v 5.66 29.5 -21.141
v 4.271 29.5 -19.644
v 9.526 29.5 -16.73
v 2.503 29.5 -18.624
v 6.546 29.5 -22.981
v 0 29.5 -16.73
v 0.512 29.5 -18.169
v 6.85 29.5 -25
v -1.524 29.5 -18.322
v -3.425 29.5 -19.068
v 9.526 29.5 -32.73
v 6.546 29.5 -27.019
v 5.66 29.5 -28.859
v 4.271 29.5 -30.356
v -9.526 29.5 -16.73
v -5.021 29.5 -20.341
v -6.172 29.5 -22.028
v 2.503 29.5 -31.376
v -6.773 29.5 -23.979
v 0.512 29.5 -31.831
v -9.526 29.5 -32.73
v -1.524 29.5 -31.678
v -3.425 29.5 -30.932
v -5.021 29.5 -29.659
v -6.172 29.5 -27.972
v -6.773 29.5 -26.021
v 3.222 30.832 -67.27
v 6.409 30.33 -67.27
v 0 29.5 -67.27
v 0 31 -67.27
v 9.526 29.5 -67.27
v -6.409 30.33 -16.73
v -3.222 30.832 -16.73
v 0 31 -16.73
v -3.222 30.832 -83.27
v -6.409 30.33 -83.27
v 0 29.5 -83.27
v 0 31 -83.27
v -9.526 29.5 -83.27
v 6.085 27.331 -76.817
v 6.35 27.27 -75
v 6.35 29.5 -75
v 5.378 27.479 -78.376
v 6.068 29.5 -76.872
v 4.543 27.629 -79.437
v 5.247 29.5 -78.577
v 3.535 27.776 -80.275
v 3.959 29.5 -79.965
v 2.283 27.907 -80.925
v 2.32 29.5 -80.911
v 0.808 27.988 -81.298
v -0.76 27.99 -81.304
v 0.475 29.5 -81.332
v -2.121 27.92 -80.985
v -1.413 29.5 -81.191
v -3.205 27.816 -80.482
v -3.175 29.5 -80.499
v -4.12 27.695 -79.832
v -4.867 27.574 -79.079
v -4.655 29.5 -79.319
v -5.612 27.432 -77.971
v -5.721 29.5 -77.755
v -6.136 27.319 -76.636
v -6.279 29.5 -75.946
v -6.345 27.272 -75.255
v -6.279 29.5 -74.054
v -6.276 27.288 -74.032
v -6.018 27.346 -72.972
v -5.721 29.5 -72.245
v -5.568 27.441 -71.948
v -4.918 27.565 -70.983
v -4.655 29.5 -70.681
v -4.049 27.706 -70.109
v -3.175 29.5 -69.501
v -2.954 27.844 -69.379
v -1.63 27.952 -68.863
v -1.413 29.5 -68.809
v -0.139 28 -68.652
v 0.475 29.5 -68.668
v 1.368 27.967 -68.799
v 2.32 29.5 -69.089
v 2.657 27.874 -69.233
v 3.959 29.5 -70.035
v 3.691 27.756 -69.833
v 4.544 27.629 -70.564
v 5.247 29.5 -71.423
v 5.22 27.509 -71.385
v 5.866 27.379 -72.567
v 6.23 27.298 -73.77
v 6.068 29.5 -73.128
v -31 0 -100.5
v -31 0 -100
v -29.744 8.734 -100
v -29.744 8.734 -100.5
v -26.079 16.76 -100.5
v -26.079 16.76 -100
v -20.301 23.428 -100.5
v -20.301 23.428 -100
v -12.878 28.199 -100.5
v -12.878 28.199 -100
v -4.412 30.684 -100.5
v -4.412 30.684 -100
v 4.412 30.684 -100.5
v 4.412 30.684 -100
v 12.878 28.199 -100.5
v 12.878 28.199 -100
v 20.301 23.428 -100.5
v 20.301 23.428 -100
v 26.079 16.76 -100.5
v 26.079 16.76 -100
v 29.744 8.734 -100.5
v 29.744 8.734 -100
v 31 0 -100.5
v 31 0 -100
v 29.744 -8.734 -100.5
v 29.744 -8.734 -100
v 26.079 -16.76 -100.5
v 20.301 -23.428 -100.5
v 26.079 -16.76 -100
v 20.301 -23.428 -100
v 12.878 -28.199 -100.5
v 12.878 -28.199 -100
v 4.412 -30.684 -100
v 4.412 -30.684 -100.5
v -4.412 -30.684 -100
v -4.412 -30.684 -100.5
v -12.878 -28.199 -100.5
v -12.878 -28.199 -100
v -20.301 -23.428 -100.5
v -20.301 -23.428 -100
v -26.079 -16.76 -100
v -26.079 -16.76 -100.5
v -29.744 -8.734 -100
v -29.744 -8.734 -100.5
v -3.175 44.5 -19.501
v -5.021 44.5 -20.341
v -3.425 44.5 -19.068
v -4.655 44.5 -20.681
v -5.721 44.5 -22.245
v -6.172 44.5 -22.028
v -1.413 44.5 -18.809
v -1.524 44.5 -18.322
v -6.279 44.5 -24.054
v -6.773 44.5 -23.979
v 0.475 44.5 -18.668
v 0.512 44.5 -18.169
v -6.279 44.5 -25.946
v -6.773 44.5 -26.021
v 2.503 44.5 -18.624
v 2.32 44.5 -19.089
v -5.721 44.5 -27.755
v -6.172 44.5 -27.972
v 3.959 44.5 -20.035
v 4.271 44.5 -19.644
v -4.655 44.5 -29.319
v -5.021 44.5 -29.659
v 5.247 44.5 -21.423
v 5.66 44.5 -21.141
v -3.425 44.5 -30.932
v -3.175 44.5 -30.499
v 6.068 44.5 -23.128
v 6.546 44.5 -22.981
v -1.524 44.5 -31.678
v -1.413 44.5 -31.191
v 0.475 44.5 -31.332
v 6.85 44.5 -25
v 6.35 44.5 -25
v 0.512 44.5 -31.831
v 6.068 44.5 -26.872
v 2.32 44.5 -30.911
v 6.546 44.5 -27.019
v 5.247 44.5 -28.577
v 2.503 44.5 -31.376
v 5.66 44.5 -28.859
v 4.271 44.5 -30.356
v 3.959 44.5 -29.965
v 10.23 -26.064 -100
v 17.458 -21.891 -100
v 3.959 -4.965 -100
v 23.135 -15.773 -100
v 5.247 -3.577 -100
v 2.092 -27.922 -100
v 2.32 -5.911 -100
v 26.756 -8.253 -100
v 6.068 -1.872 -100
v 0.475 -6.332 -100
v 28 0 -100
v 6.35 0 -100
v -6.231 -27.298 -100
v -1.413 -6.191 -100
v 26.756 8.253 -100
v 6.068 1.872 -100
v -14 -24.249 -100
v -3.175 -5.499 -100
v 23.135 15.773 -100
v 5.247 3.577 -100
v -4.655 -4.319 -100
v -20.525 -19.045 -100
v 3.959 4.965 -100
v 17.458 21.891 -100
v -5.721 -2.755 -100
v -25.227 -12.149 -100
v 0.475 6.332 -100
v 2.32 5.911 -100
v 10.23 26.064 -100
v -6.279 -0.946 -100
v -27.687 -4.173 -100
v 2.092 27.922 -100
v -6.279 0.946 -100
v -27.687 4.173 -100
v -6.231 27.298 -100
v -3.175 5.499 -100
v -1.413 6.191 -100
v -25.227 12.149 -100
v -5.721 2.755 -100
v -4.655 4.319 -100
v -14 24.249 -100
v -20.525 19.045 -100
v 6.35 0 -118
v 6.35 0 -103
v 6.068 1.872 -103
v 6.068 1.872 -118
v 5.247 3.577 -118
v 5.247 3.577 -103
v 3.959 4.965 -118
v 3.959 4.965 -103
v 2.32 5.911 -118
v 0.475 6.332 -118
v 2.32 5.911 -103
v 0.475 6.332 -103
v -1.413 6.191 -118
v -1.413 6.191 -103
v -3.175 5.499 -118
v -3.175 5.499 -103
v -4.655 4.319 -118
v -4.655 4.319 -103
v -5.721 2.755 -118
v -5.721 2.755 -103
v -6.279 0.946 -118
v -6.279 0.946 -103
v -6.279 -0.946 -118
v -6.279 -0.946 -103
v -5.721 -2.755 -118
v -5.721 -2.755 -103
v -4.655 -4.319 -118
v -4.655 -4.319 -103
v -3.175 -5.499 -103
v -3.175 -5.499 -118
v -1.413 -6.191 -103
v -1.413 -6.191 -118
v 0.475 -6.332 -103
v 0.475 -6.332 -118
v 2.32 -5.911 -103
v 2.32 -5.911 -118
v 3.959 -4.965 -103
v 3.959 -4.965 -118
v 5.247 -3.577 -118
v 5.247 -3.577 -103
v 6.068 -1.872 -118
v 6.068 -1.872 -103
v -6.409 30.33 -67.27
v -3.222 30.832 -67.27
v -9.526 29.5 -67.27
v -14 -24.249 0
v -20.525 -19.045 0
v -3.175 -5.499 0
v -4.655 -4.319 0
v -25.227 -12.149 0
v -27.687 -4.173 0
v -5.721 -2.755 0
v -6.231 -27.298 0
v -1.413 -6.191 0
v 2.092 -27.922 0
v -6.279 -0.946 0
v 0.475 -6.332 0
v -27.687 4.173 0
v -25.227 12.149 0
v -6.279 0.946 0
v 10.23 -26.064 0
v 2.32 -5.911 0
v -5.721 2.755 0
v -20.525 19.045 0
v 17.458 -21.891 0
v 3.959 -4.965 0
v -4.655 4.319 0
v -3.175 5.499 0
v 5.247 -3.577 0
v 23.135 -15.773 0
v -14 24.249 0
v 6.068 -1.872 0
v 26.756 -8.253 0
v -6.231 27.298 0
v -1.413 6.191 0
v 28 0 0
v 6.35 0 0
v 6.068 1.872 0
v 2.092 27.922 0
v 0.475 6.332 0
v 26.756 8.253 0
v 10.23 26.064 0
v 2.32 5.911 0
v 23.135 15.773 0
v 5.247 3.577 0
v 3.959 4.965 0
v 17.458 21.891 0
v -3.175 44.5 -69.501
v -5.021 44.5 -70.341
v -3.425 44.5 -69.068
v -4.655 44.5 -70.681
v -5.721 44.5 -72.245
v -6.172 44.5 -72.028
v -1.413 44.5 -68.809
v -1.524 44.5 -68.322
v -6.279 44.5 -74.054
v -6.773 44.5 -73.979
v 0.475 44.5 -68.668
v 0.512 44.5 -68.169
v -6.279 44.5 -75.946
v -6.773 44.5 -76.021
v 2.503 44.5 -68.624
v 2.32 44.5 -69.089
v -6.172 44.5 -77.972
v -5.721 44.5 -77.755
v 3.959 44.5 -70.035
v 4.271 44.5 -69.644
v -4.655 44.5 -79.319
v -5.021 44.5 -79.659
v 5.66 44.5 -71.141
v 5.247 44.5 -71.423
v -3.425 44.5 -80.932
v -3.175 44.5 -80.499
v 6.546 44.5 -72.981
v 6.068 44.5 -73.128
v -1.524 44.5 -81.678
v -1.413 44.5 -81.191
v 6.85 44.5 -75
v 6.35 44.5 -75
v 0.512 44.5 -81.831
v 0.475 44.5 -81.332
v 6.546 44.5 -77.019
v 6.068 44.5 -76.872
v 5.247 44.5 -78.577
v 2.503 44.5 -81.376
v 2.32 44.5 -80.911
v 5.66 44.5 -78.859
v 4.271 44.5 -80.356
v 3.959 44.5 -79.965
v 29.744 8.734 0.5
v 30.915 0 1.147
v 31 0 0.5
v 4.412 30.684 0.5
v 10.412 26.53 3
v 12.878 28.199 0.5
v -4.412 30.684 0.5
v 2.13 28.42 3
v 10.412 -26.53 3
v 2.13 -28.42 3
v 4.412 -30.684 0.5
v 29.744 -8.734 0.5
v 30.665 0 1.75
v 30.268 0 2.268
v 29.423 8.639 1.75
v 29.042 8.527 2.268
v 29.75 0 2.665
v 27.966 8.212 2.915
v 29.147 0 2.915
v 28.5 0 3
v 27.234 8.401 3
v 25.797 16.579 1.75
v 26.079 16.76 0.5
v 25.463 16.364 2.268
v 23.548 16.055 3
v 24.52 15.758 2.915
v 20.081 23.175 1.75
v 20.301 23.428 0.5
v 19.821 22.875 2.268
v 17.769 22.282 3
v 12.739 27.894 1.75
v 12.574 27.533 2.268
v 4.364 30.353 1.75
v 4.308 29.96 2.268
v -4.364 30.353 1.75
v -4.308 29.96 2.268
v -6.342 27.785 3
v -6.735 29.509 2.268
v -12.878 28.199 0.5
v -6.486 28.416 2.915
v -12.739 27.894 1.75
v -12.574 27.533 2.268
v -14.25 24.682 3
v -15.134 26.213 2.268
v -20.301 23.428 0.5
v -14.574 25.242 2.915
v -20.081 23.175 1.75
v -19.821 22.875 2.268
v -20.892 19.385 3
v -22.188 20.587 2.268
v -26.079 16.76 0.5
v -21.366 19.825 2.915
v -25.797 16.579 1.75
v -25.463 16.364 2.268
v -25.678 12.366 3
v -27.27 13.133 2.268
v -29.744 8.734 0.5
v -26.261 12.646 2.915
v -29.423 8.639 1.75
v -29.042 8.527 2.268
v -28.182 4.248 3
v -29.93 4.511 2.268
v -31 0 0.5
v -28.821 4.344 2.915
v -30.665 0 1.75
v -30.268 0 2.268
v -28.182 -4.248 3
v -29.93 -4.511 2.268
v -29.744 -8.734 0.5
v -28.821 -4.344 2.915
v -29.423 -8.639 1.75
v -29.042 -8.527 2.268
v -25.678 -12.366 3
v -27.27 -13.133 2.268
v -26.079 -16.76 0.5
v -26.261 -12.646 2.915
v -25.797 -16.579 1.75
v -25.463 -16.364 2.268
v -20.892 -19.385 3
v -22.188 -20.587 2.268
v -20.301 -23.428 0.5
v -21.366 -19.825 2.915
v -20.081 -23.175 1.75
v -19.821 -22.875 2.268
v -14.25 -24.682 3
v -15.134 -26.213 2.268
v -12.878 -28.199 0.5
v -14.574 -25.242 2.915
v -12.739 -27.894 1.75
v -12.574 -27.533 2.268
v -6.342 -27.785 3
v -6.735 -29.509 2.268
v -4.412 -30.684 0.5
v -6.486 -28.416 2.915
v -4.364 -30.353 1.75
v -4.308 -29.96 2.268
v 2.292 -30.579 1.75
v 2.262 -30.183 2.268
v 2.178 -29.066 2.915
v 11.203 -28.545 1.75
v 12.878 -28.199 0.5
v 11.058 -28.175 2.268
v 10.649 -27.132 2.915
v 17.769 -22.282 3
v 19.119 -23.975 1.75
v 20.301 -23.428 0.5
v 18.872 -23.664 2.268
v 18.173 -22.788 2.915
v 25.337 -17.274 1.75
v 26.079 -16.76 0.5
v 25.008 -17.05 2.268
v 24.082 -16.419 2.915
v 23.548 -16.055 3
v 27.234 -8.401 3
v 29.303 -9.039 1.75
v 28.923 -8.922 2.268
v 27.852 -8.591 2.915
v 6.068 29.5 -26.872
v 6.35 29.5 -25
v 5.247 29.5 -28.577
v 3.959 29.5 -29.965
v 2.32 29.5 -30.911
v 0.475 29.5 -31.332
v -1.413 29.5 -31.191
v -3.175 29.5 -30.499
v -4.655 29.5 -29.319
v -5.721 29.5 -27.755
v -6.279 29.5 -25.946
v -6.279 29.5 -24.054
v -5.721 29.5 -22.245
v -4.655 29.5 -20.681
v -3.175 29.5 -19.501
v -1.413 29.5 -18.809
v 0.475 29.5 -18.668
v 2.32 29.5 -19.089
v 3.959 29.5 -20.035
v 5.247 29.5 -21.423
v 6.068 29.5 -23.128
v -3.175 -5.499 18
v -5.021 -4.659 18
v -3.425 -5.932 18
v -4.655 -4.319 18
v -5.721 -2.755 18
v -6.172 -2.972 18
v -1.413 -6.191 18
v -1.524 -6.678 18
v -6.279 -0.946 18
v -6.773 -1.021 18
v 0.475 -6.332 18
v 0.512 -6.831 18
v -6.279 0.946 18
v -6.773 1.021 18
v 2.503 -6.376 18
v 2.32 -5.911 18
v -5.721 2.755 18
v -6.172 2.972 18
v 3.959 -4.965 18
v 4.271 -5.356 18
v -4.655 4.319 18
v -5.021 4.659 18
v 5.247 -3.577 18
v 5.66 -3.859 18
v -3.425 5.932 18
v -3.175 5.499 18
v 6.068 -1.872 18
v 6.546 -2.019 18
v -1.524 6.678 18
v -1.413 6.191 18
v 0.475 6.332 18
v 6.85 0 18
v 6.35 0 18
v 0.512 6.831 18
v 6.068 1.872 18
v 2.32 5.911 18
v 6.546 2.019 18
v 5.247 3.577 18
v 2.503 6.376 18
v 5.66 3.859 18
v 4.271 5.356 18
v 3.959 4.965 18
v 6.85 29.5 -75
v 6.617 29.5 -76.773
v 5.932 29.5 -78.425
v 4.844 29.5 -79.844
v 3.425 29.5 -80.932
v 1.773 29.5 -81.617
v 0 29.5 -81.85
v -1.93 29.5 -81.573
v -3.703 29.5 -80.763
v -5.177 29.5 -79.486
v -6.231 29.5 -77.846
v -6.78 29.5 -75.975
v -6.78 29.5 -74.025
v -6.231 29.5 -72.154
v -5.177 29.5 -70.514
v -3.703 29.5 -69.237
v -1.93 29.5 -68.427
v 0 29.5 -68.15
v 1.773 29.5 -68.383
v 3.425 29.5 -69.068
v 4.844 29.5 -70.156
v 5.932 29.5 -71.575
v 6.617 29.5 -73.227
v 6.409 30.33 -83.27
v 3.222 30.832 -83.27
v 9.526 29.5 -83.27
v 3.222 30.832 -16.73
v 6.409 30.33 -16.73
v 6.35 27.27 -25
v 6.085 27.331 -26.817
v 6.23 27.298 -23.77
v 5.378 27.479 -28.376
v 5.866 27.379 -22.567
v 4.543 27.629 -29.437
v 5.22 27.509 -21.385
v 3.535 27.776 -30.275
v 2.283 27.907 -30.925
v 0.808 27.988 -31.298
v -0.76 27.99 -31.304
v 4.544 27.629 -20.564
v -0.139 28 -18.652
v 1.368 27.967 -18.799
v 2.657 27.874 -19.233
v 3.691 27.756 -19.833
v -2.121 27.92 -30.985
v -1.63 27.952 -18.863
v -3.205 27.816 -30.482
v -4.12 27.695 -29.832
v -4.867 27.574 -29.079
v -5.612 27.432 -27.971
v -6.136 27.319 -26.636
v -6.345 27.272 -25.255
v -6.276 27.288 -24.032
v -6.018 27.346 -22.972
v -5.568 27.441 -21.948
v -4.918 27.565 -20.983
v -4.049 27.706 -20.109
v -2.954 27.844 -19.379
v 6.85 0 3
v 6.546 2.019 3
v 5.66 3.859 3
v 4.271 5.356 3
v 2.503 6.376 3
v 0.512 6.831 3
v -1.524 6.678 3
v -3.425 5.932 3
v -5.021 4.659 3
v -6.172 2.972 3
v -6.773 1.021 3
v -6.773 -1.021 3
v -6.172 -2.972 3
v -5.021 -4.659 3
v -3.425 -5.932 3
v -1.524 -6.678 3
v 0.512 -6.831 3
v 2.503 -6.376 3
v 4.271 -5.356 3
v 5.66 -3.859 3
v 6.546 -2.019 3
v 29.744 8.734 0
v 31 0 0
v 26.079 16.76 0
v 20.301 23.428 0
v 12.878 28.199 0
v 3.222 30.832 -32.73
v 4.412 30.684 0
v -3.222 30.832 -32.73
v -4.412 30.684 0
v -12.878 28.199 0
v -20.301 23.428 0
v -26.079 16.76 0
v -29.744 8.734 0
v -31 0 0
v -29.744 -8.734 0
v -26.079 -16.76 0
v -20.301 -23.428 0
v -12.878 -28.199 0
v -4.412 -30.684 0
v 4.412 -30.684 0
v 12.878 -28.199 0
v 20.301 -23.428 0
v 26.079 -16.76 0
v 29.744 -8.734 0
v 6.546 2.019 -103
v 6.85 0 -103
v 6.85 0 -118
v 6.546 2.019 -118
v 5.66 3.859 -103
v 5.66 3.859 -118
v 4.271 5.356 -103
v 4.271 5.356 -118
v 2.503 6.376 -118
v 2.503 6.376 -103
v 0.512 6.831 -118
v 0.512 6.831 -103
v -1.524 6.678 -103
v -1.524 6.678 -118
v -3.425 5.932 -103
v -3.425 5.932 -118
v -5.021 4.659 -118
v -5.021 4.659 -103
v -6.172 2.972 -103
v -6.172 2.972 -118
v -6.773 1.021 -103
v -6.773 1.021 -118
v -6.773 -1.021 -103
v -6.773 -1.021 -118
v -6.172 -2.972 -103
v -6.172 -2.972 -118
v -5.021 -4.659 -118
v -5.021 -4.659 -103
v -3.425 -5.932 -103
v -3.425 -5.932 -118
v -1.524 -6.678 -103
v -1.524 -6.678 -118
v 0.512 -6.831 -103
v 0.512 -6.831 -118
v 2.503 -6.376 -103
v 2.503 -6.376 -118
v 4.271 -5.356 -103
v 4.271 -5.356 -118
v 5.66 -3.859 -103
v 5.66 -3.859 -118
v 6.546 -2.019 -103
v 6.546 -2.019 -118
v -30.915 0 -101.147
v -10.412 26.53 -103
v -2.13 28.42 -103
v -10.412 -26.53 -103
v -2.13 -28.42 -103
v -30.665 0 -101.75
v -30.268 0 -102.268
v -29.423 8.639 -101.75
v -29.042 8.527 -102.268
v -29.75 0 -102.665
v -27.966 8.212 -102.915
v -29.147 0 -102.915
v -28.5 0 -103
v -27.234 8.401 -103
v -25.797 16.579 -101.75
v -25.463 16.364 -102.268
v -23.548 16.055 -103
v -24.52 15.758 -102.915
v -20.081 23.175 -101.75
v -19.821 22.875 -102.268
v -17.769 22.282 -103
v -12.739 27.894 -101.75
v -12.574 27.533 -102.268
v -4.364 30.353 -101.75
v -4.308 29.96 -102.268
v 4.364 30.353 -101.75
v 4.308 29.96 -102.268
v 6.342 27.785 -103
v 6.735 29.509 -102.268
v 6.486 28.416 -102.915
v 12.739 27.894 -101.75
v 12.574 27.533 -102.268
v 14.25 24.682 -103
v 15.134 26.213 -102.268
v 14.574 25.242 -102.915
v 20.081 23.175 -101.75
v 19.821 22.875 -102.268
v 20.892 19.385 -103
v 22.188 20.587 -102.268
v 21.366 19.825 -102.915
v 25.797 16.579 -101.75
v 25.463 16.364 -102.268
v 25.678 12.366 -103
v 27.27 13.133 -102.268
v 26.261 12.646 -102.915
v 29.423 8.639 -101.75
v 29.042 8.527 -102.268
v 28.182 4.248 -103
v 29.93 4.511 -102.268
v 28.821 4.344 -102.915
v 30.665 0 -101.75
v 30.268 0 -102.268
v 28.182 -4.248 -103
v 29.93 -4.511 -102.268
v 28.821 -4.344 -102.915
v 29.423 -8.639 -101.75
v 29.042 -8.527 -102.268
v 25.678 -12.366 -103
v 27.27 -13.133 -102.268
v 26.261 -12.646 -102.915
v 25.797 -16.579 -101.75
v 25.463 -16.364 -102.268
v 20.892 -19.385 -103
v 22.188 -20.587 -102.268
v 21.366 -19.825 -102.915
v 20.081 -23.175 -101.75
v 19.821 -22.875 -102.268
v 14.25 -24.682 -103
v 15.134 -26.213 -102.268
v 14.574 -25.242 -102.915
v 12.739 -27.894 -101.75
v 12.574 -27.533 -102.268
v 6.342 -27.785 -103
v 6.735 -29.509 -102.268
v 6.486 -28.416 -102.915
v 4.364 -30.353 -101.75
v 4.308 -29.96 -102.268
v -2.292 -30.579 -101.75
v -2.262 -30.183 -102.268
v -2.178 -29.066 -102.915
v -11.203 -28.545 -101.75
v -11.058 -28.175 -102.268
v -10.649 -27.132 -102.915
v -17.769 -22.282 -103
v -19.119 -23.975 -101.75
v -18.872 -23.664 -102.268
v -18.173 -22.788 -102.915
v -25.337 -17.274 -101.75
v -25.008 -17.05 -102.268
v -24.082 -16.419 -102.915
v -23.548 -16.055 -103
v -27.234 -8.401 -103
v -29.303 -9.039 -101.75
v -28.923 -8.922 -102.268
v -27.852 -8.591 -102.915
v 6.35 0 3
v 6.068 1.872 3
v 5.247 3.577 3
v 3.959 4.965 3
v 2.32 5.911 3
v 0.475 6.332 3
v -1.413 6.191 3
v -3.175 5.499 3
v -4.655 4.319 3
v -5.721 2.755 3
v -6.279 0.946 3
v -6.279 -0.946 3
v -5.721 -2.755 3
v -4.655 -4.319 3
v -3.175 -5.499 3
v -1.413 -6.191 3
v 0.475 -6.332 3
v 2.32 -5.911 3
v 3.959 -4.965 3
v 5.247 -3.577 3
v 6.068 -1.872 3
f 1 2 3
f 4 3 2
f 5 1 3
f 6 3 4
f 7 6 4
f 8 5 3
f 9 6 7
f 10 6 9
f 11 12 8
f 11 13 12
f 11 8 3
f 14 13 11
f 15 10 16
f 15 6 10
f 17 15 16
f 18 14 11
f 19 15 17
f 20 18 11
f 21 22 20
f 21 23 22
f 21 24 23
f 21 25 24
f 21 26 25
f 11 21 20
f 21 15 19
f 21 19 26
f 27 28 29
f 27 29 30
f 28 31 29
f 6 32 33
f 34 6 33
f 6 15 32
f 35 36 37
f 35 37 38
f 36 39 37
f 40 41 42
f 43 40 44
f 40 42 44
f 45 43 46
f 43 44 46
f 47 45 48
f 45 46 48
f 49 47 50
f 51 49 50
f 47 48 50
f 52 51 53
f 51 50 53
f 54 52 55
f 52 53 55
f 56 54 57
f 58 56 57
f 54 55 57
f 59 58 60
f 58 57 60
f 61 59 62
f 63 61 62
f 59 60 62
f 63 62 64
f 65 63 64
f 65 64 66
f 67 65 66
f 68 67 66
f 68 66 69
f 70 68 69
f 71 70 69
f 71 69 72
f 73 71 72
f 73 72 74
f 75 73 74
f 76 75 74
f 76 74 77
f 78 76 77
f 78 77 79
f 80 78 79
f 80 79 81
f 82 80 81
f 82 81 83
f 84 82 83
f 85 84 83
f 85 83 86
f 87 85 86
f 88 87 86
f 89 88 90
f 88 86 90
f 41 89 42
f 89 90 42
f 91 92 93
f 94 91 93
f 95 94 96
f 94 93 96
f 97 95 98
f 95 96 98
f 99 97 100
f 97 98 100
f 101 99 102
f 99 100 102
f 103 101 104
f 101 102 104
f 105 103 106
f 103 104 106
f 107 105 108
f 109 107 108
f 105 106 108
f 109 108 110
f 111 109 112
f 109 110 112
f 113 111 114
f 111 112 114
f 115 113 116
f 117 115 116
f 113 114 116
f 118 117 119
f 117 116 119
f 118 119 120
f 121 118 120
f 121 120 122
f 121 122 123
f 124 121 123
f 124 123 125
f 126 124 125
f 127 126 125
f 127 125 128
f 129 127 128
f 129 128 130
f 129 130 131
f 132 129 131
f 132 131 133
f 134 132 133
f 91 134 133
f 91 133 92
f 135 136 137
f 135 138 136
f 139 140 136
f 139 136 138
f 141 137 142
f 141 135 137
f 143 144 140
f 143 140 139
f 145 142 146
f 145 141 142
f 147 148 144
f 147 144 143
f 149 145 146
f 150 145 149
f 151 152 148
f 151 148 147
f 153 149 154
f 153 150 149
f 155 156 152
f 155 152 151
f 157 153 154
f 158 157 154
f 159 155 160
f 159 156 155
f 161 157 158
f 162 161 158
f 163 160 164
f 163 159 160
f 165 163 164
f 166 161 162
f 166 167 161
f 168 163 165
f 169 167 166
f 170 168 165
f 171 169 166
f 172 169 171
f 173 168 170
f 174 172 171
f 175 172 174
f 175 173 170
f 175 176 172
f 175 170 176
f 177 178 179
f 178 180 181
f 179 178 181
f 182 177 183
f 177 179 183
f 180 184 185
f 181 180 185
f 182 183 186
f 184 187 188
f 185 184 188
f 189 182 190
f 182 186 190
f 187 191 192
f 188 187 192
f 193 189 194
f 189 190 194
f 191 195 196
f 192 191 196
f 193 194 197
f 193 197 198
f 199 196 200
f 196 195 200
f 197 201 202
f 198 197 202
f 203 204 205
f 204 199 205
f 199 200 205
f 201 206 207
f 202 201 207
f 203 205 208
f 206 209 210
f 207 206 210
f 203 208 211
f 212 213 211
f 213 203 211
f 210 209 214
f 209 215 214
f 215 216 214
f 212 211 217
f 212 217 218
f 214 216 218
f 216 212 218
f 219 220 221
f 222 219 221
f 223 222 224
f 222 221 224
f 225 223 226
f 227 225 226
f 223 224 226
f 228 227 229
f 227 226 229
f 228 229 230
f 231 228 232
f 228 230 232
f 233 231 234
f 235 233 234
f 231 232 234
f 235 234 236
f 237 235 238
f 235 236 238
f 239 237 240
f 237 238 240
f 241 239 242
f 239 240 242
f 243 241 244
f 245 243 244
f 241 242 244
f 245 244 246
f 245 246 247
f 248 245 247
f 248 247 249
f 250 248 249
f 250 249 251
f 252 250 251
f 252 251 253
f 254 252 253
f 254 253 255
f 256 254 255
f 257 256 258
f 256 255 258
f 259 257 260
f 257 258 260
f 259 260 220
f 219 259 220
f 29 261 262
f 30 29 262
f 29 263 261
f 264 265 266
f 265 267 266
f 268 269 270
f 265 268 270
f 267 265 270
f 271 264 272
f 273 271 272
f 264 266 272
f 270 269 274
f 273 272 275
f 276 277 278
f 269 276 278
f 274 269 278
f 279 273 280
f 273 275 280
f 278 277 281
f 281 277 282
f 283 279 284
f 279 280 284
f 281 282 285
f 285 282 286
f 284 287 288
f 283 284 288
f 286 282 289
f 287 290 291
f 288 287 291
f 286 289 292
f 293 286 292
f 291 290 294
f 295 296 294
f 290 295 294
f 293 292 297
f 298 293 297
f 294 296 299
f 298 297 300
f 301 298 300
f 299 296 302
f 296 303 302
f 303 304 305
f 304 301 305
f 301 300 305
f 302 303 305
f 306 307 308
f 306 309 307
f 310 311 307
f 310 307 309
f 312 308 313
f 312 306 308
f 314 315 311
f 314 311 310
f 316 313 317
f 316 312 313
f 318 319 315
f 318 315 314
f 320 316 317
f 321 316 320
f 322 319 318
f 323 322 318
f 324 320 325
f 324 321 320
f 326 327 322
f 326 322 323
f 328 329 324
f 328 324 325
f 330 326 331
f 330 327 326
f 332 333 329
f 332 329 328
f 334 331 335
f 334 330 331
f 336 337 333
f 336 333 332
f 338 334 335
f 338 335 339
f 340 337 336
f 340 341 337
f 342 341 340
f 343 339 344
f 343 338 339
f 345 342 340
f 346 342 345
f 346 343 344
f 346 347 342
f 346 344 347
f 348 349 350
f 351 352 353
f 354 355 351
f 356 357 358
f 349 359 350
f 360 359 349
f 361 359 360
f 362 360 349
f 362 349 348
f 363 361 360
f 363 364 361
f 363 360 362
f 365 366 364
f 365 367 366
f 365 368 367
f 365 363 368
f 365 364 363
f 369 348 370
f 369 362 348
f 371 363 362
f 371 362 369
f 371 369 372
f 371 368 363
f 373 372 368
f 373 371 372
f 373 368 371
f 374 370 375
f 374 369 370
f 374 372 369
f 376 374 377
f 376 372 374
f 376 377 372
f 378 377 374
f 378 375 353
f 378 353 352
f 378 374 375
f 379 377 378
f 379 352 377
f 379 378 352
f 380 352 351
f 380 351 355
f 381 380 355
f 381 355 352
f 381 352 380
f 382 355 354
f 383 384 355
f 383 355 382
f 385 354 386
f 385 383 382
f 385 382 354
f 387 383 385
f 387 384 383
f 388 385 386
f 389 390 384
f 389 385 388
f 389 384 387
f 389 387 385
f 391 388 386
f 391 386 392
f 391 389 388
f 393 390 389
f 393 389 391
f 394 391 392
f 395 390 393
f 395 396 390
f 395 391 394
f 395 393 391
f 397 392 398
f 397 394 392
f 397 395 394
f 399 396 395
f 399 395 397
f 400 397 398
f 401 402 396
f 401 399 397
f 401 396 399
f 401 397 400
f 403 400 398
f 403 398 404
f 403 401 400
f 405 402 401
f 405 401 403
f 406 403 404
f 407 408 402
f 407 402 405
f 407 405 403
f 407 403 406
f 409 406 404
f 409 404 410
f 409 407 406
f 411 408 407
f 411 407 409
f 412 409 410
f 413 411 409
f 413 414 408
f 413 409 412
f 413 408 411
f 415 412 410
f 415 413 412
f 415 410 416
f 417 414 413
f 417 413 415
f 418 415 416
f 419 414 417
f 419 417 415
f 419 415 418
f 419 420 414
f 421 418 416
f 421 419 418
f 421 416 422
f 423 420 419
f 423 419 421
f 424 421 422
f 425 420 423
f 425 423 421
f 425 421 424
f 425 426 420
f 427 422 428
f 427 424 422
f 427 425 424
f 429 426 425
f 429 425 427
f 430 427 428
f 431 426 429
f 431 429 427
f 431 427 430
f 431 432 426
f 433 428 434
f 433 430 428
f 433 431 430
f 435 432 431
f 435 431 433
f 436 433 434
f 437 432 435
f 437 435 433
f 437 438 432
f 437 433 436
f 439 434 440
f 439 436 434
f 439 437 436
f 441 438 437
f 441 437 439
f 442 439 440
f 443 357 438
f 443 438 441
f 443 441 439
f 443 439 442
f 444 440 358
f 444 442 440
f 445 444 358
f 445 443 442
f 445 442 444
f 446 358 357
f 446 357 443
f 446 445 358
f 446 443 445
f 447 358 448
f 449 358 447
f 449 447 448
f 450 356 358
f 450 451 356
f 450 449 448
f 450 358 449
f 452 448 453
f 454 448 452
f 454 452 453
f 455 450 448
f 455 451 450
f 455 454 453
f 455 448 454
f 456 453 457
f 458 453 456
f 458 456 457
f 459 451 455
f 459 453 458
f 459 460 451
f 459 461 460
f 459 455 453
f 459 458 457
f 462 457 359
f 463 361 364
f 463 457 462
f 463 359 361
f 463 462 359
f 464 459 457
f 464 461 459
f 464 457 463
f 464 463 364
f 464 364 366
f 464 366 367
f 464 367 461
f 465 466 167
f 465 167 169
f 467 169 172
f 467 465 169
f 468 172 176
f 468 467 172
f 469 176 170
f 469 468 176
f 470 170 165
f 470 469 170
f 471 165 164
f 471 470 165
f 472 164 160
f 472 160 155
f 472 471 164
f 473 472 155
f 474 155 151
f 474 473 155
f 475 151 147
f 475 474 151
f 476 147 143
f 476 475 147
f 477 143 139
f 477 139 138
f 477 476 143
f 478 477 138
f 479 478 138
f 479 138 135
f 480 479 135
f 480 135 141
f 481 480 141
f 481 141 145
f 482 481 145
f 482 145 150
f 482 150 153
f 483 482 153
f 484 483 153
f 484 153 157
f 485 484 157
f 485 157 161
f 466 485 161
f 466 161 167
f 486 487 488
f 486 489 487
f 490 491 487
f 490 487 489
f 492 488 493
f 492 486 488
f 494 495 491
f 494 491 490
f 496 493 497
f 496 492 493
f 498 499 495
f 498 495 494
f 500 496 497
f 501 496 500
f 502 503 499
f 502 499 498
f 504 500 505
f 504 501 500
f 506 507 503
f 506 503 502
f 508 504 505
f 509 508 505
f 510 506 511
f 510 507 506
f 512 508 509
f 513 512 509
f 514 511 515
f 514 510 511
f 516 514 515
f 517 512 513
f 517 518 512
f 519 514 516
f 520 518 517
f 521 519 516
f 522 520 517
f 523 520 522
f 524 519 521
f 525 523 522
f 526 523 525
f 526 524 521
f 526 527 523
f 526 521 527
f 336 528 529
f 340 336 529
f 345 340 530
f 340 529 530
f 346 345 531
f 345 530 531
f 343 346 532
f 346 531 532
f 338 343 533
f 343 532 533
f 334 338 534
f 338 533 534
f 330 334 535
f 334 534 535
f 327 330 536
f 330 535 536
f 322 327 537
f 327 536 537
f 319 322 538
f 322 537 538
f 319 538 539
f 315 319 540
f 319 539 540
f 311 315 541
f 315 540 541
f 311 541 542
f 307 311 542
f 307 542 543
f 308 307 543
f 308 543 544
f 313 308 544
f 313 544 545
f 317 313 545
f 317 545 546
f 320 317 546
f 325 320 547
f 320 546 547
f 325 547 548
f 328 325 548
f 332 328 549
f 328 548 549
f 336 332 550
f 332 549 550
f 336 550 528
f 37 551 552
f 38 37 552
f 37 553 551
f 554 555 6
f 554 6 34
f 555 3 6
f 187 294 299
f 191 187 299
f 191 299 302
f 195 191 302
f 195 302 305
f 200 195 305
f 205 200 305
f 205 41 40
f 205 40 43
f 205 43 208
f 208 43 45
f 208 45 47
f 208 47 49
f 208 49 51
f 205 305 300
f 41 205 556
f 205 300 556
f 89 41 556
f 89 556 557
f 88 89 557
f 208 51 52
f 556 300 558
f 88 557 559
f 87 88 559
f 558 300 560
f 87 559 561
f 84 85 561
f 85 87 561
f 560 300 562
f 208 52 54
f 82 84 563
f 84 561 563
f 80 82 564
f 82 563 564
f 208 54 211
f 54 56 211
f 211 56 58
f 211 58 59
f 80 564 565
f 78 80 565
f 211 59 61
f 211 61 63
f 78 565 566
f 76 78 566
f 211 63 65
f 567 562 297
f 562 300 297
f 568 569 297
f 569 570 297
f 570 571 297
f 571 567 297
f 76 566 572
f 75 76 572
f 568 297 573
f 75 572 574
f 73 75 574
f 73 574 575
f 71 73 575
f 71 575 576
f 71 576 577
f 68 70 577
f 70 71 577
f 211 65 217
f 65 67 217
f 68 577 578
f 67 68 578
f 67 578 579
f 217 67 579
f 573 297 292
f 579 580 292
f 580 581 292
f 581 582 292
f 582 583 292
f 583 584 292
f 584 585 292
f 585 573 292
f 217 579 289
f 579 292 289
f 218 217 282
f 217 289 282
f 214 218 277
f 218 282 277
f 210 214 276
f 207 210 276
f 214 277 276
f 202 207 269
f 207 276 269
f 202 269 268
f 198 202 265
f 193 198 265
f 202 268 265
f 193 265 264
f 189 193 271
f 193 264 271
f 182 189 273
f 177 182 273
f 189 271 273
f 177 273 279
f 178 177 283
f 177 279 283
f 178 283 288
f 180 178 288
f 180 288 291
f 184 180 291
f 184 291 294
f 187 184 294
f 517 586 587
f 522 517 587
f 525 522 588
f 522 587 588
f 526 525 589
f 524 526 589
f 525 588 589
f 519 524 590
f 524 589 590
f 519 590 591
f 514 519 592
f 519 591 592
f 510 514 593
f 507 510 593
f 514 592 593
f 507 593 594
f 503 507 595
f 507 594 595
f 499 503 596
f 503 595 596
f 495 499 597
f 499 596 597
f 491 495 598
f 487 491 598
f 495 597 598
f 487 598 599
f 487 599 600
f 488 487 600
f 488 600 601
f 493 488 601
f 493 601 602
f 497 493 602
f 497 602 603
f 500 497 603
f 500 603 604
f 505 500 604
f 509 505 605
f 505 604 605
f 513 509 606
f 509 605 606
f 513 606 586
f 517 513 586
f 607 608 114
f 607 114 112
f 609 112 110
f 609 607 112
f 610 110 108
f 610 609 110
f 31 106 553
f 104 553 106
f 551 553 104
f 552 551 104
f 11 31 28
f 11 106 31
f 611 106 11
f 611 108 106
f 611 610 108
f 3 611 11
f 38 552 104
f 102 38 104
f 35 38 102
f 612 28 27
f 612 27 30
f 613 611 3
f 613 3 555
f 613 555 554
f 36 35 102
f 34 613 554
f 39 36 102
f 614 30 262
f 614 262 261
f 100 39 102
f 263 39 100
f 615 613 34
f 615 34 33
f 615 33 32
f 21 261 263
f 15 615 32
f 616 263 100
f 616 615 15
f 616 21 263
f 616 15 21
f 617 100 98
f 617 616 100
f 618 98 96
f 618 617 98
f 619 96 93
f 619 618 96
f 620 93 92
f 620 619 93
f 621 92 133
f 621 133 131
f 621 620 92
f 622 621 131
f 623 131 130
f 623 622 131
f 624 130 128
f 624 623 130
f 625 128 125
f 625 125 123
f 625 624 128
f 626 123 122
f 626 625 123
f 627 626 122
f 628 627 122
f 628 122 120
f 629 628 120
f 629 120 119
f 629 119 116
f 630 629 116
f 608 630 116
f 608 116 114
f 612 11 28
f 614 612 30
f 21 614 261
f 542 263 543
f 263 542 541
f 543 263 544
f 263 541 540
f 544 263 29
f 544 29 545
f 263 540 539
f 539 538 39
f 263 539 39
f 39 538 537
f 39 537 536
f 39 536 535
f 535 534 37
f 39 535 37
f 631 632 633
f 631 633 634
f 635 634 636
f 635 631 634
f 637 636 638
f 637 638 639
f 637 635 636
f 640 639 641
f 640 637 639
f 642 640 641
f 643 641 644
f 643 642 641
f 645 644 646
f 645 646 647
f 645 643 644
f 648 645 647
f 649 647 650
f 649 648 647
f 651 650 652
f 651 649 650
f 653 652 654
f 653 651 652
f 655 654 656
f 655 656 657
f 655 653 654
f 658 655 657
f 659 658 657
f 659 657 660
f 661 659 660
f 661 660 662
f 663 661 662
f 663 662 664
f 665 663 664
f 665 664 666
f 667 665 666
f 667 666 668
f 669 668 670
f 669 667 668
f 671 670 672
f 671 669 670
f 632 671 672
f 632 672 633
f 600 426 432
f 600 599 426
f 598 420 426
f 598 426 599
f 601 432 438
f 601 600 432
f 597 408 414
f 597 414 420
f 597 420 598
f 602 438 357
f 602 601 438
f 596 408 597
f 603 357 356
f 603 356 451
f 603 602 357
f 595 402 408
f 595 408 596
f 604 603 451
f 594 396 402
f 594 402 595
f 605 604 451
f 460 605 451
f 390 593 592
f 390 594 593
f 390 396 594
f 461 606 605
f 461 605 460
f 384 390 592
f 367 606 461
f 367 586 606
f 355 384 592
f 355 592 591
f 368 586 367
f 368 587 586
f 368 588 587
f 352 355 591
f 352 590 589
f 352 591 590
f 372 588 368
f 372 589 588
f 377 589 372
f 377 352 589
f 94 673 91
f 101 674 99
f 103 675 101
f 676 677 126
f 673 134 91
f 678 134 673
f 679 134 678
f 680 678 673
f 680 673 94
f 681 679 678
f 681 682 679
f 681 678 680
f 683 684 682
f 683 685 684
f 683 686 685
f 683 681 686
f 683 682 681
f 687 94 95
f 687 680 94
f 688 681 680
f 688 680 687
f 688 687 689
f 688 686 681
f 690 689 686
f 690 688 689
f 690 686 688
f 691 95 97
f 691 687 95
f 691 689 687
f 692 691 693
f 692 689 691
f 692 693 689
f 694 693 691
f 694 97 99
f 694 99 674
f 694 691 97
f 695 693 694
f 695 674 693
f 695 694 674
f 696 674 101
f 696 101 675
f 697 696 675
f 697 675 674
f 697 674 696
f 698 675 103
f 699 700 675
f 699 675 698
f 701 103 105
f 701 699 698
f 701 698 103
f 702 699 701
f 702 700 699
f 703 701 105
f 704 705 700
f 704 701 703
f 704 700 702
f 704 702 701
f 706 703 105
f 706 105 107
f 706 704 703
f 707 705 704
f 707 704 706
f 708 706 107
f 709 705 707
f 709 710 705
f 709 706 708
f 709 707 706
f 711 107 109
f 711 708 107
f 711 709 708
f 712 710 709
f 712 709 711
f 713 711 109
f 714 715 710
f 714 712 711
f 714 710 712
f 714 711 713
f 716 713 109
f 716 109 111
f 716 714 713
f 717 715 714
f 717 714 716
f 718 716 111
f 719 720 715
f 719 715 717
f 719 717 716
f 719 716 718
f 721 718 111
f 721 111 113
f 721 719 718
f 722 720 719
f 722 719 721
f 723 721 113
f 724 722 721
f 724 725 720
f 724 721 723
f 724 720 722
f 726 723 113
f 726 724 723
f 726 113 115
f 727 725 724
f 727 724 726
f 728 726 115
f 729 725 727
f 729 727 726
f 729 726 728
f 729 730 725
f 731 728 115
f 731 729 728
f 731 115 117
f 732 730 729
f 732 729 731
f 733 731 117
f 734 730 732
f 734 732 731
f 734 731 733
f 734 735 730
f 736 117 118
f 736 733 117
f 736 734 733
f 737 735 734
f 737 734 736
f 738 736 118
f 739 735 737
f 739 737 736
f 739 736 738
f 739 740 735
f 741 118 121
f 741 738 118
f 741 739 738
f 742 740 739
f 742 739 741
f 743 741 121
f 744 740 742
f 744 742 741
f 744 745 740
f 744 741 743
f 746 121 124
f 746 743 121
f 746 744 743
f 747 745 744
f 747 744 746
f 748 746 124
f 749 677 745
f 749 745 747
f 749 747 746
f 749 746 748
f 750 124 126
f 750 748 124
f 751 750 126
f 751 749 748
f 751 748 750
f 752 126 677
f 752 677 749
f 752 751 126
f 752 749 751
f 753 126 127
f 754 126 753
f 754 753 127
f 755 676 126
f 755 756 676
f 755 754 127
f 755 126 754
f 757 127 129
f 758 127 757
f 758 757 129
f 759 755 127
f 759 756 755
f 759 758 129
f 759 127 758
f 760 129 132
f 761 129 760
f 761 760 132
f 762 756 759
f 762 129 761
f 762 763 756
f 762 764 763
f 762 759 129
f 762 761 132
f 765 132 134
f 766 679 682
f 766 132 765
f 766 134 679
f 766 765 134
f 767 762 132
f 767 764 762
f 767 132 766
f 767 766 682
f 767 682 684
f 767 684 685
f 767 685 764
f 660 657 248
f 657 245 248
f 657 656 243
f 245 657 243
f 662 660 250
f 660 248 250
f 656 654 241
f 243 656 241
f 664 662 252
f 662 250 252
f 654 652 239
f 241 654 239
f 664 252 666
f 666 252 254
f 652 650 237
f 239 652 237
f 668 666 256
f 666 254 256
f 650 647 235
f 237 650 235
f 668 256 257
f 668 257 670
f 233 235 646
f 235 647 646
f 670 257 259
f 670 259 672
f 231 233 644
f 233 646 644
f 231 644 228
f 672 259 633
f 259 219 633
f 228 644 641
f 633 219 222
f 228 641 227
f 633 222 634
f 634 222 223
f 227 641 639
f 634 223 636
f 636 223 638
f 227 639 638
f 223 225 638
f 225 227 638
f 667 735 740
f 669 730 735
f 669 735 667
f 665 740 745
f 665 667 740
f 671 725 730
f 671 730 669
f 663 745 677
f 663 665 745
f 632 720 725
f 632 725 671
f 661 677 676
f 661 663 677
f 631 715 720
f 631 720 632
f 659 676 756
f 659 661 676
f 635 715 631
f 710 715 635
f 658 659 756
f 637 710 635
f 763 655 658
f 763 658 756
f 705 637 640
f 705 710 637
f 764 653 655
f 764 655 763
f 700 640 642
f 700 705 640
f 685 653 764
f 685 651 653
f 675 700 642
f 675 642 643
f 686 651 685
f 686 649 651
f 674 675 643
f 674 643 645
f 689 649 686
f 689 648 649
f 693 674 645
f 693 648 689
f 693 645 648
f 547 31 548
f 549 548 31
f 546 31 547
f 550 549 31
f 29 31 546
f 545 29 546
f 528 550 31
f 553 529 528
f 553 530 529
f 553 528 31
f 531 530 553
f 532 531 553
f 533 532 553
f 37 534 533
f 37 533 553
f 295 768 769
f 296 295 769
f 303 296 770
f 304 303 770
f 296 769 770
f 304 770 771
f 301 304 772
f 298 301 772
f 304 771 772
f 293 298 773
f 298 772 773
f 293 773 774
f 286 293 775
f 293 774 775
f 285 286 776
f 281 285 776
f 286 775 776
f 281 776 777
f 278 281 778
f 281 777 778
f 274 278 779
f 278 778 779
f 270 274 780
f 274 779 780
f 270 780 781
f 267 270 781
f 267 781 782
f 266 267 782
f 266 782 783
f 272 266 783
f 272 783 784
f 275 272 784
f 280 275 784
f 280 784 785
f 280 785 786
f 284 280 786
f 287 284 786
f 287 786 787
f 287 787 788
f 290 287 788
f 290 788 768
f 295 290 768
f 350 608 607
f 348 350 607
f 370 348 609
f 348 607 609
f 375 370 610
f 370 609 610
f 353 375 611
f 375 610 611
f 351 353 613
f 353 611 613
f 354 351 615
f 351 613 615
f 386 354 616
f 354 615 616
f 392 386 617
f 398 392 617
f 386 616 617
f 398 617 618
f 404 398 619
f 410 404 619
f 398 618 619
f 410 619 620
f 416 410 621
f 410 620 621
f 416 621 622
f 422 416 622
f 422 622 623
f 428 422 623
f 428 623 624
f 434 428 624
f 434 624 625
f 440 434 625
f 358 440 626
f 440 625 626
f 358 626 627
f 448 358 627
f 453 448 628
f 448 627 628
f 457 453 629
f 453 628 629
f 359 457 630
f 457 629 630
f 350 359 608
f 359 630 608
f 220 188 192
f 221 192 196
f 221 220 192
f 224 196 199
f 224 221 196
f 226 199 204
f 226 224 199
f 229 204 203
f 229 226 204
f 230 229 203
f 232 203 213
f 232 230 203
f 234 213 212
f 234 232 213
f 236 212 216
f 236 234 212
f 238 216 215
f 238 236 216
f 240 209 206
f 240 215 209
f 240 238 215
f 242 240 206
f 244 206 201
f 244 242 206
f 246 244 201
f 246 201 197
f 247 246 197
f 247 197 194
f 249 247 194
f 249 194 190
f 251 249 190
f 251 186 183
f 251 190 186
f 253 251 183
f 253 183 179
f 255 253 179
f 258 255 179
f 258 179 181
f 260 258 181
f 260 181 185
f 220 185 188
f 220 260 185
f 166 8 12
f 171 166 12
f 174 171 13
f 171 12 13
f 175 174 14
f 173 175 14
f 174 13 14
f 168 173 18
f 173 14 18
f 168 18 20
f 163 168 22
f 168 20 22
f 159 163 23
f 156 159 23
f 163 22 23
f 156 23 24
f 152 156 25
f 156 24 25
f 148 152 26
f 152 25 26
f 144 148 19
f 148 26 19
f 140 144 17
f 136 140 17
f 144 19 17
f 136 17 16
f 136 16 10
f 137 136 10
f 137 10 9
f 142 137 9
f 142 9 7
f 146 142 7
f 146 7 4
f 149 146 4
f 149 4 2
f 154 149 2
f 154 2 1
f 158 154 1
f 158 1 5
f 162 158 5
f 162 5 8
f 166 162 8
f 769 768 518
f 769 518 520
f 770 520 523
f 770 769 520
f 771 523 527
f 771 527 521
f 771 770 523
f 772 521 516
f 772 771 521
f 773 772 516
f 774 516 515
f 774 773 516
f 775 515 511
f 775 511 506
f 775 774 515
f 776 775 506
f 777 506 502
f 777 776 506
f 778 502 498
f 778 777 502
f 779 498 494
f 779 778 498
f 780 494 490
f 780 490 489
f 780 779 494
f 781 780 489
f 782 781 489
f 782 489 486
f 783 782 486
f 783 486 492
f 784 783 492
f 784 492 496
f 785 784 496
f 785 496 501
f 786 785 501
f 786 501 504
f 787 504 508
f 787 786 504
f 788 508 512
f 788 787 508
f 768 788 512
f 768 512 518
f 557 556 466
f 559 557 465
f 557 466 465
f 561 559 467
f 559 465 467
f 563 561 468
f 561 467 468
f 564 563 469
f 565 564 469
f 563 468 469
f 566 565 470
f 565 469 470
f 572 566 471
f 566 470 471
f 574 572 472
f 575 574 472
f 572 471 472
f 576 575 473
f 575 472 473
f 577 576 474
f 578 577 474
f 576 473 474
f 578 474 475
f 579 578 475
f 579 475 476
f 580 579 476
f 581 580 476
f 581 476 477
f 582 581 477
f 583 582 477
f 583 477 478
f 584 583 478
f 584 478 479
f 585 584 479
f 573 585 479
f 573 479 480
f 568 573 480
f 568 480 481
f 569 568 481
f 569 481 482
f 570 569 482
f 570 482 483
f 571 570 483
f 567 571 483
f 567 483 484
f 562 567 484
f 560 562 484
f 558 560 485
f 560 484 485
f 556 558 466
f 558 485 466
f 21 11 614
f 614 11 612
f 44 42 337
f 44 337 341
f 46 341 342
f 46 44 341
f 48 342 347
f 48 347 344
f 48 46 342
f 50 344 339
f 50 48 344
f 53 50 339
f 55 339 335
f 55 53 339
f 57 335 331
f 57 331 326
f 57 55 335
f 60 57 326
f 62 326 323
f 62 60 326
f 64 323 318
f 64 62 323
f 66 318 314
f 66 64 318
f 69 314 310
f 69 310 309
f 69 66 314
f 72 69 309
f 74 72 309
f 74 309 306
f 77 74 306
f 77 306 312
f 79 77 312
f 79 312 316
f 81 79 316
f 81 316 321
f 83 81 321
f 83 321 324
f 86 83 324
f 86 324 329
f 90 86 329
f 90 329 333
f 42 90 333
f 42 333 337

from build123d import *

# Parameters (mm, degrees)
SKETCH2_R               = 31
SKETCH2_R_2             = 28
BOSS_EXTRUDE1_DEPTH     = 100
SKETCH3_R               = 31
BOSS_EXTRUDE2_DEPTH     = 3
SKETCH4_R               = 31
BOSS_EXTRUDE3_DEPTH     = 3
SKETCH5_W               = 16
SKETCH5_H               = 1.5
CUT_EXTRUDE1_DEPTH      = 32
CUT_EXTRUDE1_DEPTH_BACK = 32
SKETCH6_R               = 6.85
SKETCH6_R_2             = 6.35
BOSS_EXTRUDE4_DEPTH     = 15
SKETCH6_2_R             = 6.35
CUT_EXTRUDE2_DEPTH      = 15
SKETCH7_R               = 6.85
SKETCH7_R_2             = 6.35
BOSS_EXTRUDE5_DEPTH     = 15
SKETCH7_2_R             = 6.35
CUT_EXTRUDE3_DEPTH      = 15
FILLET1_R               = 2.5


with BuildPart() as part:
    # Sketch2 → Boss-Extrude1 (new body)
    with BuildSketch(Plane.XY):
        Circle(SKETCH2_R)
        Circle(SKETCH2_R_2, mode=Mode.SUBTRACT)
    extrude(amount=-BOSS_EXTRUDE1_DEPTH)

    # Sketch3 → Boss-Extrude2 (add)
    with BuildSketch(Plane.XY):
        Circle(SKETCH3_R)
    extrude(amount=BOSS_EXTRUDE2_DEPTH)

    # Sketch4 → Boss-Extrude3 (add)
    with BuildSketch(Plane(origin=(0, 0, -100), x_dir=(-1, 0, 0), z_dir=(0, 0, -1))):
        Circle(SKETCH4_R)
    extrude(amount=BOSS_EXTRUDE3_DEPTH)

    # Sketch5 → Cut-Extrude1 (cut, two sides)
    with BuildSketch(Plane(origin=(0, 0, 0), x_dir=(0, 0, -1), z_dir=(1, 0, 0))) as cut_extrude1_sk:
        with Locations((75.269911272, 30.25)):
            Rectangle(SKETCH5_W, SKETCH5_H)
        with Locations((24.730088728, 30.25)):
            Rectangle(SKETCH5_W, SKETCH5_H)
    extrude(amount=CUT_EXTRUDE1_DEPTH, mode=Mode.SUBTRACT)
    extrude(cut_extrude1_sk.sketch, amount=-CUT_EXTRUDE1_DEPTH_BACK, mode=Mode.SUBTRACT)

    # Sketch6 → Boss-Extrude4 (add)
    with BuildSketch(Plane(origin=(0, 29.5, 0), x_dir=(1, 0, 0), z_dir=(0, 1, 0))):
        with Locations((0, 25)):
            Circle(SKETCH6_R)
        with Locations((0, 25)):
            Circle(SKETCH6_R_2, mode=Mode.SUBTRACT)
        with Locations((0, 75)):
            Circle(SKETCH6_R)
        with Locations((0, 75)):
            Circle(SKETCH6_R_2, mode=Mode.SUBTRACT)
    extrude(amount=BOSS_EXTRUDE4_DEPTH)

    # Sketch6<2> → Cut-Extrude2 (cut)
    with BuildSketch(Plane(origin=(0, 29.5, 0), x_dir=(1, 0, 0), z_dir=(0, 1, 0))):
        with Locations((0, 25)):
            Circle(SKETCH6_2_R)
        with Locations((0, 75)):
            Circle(SKETCH6_2_R)
    extrude(amount=-CUT_EXTRUDE2_DEPTH, mode=Mode.SUBTRACT)

    # Sketch7 → Boss-Extrude5 (add)
    with BuildSketch(Plane.XY.offset(3)):
        Circle(SKETCH7_R)
        Circle(SKETCH7_R_2, mode=Mode.SUBTRACT)
    boss_extrude5 = extrude(amount=BOSS_EXTRUDE5_DEPTH)

    # Sketch7<2> → Cut-Extrude3 (cut)
    with BuildSketch(Plane.XY.offset(3)):
        Circle(SKETCH7_2_R)
    cut_extrude3 = extrude(amount=-CUT_EXTRUDE3_DEPTH, mode=Mode.SUBTRACT)

    # Mirror2: Boss-Extrude5, Cut-Extrude3 across plane
    add(boss_extrude5.mirror(Plane.XY.offset(-50)))
    add(cut_extrude3.mirror(Plane.XY.offset(-50)), mode=Mode.SUBTRACT)

    # Fillet1
    fillet1_edges = [part.edges().sort_by_distance(p)[0] for p in [
        (-31, 0, 3),
        (31, 0, -103),
    ]]
    fillet(fillet1_edges, radius=FILLET1_R)


solid = part.part
